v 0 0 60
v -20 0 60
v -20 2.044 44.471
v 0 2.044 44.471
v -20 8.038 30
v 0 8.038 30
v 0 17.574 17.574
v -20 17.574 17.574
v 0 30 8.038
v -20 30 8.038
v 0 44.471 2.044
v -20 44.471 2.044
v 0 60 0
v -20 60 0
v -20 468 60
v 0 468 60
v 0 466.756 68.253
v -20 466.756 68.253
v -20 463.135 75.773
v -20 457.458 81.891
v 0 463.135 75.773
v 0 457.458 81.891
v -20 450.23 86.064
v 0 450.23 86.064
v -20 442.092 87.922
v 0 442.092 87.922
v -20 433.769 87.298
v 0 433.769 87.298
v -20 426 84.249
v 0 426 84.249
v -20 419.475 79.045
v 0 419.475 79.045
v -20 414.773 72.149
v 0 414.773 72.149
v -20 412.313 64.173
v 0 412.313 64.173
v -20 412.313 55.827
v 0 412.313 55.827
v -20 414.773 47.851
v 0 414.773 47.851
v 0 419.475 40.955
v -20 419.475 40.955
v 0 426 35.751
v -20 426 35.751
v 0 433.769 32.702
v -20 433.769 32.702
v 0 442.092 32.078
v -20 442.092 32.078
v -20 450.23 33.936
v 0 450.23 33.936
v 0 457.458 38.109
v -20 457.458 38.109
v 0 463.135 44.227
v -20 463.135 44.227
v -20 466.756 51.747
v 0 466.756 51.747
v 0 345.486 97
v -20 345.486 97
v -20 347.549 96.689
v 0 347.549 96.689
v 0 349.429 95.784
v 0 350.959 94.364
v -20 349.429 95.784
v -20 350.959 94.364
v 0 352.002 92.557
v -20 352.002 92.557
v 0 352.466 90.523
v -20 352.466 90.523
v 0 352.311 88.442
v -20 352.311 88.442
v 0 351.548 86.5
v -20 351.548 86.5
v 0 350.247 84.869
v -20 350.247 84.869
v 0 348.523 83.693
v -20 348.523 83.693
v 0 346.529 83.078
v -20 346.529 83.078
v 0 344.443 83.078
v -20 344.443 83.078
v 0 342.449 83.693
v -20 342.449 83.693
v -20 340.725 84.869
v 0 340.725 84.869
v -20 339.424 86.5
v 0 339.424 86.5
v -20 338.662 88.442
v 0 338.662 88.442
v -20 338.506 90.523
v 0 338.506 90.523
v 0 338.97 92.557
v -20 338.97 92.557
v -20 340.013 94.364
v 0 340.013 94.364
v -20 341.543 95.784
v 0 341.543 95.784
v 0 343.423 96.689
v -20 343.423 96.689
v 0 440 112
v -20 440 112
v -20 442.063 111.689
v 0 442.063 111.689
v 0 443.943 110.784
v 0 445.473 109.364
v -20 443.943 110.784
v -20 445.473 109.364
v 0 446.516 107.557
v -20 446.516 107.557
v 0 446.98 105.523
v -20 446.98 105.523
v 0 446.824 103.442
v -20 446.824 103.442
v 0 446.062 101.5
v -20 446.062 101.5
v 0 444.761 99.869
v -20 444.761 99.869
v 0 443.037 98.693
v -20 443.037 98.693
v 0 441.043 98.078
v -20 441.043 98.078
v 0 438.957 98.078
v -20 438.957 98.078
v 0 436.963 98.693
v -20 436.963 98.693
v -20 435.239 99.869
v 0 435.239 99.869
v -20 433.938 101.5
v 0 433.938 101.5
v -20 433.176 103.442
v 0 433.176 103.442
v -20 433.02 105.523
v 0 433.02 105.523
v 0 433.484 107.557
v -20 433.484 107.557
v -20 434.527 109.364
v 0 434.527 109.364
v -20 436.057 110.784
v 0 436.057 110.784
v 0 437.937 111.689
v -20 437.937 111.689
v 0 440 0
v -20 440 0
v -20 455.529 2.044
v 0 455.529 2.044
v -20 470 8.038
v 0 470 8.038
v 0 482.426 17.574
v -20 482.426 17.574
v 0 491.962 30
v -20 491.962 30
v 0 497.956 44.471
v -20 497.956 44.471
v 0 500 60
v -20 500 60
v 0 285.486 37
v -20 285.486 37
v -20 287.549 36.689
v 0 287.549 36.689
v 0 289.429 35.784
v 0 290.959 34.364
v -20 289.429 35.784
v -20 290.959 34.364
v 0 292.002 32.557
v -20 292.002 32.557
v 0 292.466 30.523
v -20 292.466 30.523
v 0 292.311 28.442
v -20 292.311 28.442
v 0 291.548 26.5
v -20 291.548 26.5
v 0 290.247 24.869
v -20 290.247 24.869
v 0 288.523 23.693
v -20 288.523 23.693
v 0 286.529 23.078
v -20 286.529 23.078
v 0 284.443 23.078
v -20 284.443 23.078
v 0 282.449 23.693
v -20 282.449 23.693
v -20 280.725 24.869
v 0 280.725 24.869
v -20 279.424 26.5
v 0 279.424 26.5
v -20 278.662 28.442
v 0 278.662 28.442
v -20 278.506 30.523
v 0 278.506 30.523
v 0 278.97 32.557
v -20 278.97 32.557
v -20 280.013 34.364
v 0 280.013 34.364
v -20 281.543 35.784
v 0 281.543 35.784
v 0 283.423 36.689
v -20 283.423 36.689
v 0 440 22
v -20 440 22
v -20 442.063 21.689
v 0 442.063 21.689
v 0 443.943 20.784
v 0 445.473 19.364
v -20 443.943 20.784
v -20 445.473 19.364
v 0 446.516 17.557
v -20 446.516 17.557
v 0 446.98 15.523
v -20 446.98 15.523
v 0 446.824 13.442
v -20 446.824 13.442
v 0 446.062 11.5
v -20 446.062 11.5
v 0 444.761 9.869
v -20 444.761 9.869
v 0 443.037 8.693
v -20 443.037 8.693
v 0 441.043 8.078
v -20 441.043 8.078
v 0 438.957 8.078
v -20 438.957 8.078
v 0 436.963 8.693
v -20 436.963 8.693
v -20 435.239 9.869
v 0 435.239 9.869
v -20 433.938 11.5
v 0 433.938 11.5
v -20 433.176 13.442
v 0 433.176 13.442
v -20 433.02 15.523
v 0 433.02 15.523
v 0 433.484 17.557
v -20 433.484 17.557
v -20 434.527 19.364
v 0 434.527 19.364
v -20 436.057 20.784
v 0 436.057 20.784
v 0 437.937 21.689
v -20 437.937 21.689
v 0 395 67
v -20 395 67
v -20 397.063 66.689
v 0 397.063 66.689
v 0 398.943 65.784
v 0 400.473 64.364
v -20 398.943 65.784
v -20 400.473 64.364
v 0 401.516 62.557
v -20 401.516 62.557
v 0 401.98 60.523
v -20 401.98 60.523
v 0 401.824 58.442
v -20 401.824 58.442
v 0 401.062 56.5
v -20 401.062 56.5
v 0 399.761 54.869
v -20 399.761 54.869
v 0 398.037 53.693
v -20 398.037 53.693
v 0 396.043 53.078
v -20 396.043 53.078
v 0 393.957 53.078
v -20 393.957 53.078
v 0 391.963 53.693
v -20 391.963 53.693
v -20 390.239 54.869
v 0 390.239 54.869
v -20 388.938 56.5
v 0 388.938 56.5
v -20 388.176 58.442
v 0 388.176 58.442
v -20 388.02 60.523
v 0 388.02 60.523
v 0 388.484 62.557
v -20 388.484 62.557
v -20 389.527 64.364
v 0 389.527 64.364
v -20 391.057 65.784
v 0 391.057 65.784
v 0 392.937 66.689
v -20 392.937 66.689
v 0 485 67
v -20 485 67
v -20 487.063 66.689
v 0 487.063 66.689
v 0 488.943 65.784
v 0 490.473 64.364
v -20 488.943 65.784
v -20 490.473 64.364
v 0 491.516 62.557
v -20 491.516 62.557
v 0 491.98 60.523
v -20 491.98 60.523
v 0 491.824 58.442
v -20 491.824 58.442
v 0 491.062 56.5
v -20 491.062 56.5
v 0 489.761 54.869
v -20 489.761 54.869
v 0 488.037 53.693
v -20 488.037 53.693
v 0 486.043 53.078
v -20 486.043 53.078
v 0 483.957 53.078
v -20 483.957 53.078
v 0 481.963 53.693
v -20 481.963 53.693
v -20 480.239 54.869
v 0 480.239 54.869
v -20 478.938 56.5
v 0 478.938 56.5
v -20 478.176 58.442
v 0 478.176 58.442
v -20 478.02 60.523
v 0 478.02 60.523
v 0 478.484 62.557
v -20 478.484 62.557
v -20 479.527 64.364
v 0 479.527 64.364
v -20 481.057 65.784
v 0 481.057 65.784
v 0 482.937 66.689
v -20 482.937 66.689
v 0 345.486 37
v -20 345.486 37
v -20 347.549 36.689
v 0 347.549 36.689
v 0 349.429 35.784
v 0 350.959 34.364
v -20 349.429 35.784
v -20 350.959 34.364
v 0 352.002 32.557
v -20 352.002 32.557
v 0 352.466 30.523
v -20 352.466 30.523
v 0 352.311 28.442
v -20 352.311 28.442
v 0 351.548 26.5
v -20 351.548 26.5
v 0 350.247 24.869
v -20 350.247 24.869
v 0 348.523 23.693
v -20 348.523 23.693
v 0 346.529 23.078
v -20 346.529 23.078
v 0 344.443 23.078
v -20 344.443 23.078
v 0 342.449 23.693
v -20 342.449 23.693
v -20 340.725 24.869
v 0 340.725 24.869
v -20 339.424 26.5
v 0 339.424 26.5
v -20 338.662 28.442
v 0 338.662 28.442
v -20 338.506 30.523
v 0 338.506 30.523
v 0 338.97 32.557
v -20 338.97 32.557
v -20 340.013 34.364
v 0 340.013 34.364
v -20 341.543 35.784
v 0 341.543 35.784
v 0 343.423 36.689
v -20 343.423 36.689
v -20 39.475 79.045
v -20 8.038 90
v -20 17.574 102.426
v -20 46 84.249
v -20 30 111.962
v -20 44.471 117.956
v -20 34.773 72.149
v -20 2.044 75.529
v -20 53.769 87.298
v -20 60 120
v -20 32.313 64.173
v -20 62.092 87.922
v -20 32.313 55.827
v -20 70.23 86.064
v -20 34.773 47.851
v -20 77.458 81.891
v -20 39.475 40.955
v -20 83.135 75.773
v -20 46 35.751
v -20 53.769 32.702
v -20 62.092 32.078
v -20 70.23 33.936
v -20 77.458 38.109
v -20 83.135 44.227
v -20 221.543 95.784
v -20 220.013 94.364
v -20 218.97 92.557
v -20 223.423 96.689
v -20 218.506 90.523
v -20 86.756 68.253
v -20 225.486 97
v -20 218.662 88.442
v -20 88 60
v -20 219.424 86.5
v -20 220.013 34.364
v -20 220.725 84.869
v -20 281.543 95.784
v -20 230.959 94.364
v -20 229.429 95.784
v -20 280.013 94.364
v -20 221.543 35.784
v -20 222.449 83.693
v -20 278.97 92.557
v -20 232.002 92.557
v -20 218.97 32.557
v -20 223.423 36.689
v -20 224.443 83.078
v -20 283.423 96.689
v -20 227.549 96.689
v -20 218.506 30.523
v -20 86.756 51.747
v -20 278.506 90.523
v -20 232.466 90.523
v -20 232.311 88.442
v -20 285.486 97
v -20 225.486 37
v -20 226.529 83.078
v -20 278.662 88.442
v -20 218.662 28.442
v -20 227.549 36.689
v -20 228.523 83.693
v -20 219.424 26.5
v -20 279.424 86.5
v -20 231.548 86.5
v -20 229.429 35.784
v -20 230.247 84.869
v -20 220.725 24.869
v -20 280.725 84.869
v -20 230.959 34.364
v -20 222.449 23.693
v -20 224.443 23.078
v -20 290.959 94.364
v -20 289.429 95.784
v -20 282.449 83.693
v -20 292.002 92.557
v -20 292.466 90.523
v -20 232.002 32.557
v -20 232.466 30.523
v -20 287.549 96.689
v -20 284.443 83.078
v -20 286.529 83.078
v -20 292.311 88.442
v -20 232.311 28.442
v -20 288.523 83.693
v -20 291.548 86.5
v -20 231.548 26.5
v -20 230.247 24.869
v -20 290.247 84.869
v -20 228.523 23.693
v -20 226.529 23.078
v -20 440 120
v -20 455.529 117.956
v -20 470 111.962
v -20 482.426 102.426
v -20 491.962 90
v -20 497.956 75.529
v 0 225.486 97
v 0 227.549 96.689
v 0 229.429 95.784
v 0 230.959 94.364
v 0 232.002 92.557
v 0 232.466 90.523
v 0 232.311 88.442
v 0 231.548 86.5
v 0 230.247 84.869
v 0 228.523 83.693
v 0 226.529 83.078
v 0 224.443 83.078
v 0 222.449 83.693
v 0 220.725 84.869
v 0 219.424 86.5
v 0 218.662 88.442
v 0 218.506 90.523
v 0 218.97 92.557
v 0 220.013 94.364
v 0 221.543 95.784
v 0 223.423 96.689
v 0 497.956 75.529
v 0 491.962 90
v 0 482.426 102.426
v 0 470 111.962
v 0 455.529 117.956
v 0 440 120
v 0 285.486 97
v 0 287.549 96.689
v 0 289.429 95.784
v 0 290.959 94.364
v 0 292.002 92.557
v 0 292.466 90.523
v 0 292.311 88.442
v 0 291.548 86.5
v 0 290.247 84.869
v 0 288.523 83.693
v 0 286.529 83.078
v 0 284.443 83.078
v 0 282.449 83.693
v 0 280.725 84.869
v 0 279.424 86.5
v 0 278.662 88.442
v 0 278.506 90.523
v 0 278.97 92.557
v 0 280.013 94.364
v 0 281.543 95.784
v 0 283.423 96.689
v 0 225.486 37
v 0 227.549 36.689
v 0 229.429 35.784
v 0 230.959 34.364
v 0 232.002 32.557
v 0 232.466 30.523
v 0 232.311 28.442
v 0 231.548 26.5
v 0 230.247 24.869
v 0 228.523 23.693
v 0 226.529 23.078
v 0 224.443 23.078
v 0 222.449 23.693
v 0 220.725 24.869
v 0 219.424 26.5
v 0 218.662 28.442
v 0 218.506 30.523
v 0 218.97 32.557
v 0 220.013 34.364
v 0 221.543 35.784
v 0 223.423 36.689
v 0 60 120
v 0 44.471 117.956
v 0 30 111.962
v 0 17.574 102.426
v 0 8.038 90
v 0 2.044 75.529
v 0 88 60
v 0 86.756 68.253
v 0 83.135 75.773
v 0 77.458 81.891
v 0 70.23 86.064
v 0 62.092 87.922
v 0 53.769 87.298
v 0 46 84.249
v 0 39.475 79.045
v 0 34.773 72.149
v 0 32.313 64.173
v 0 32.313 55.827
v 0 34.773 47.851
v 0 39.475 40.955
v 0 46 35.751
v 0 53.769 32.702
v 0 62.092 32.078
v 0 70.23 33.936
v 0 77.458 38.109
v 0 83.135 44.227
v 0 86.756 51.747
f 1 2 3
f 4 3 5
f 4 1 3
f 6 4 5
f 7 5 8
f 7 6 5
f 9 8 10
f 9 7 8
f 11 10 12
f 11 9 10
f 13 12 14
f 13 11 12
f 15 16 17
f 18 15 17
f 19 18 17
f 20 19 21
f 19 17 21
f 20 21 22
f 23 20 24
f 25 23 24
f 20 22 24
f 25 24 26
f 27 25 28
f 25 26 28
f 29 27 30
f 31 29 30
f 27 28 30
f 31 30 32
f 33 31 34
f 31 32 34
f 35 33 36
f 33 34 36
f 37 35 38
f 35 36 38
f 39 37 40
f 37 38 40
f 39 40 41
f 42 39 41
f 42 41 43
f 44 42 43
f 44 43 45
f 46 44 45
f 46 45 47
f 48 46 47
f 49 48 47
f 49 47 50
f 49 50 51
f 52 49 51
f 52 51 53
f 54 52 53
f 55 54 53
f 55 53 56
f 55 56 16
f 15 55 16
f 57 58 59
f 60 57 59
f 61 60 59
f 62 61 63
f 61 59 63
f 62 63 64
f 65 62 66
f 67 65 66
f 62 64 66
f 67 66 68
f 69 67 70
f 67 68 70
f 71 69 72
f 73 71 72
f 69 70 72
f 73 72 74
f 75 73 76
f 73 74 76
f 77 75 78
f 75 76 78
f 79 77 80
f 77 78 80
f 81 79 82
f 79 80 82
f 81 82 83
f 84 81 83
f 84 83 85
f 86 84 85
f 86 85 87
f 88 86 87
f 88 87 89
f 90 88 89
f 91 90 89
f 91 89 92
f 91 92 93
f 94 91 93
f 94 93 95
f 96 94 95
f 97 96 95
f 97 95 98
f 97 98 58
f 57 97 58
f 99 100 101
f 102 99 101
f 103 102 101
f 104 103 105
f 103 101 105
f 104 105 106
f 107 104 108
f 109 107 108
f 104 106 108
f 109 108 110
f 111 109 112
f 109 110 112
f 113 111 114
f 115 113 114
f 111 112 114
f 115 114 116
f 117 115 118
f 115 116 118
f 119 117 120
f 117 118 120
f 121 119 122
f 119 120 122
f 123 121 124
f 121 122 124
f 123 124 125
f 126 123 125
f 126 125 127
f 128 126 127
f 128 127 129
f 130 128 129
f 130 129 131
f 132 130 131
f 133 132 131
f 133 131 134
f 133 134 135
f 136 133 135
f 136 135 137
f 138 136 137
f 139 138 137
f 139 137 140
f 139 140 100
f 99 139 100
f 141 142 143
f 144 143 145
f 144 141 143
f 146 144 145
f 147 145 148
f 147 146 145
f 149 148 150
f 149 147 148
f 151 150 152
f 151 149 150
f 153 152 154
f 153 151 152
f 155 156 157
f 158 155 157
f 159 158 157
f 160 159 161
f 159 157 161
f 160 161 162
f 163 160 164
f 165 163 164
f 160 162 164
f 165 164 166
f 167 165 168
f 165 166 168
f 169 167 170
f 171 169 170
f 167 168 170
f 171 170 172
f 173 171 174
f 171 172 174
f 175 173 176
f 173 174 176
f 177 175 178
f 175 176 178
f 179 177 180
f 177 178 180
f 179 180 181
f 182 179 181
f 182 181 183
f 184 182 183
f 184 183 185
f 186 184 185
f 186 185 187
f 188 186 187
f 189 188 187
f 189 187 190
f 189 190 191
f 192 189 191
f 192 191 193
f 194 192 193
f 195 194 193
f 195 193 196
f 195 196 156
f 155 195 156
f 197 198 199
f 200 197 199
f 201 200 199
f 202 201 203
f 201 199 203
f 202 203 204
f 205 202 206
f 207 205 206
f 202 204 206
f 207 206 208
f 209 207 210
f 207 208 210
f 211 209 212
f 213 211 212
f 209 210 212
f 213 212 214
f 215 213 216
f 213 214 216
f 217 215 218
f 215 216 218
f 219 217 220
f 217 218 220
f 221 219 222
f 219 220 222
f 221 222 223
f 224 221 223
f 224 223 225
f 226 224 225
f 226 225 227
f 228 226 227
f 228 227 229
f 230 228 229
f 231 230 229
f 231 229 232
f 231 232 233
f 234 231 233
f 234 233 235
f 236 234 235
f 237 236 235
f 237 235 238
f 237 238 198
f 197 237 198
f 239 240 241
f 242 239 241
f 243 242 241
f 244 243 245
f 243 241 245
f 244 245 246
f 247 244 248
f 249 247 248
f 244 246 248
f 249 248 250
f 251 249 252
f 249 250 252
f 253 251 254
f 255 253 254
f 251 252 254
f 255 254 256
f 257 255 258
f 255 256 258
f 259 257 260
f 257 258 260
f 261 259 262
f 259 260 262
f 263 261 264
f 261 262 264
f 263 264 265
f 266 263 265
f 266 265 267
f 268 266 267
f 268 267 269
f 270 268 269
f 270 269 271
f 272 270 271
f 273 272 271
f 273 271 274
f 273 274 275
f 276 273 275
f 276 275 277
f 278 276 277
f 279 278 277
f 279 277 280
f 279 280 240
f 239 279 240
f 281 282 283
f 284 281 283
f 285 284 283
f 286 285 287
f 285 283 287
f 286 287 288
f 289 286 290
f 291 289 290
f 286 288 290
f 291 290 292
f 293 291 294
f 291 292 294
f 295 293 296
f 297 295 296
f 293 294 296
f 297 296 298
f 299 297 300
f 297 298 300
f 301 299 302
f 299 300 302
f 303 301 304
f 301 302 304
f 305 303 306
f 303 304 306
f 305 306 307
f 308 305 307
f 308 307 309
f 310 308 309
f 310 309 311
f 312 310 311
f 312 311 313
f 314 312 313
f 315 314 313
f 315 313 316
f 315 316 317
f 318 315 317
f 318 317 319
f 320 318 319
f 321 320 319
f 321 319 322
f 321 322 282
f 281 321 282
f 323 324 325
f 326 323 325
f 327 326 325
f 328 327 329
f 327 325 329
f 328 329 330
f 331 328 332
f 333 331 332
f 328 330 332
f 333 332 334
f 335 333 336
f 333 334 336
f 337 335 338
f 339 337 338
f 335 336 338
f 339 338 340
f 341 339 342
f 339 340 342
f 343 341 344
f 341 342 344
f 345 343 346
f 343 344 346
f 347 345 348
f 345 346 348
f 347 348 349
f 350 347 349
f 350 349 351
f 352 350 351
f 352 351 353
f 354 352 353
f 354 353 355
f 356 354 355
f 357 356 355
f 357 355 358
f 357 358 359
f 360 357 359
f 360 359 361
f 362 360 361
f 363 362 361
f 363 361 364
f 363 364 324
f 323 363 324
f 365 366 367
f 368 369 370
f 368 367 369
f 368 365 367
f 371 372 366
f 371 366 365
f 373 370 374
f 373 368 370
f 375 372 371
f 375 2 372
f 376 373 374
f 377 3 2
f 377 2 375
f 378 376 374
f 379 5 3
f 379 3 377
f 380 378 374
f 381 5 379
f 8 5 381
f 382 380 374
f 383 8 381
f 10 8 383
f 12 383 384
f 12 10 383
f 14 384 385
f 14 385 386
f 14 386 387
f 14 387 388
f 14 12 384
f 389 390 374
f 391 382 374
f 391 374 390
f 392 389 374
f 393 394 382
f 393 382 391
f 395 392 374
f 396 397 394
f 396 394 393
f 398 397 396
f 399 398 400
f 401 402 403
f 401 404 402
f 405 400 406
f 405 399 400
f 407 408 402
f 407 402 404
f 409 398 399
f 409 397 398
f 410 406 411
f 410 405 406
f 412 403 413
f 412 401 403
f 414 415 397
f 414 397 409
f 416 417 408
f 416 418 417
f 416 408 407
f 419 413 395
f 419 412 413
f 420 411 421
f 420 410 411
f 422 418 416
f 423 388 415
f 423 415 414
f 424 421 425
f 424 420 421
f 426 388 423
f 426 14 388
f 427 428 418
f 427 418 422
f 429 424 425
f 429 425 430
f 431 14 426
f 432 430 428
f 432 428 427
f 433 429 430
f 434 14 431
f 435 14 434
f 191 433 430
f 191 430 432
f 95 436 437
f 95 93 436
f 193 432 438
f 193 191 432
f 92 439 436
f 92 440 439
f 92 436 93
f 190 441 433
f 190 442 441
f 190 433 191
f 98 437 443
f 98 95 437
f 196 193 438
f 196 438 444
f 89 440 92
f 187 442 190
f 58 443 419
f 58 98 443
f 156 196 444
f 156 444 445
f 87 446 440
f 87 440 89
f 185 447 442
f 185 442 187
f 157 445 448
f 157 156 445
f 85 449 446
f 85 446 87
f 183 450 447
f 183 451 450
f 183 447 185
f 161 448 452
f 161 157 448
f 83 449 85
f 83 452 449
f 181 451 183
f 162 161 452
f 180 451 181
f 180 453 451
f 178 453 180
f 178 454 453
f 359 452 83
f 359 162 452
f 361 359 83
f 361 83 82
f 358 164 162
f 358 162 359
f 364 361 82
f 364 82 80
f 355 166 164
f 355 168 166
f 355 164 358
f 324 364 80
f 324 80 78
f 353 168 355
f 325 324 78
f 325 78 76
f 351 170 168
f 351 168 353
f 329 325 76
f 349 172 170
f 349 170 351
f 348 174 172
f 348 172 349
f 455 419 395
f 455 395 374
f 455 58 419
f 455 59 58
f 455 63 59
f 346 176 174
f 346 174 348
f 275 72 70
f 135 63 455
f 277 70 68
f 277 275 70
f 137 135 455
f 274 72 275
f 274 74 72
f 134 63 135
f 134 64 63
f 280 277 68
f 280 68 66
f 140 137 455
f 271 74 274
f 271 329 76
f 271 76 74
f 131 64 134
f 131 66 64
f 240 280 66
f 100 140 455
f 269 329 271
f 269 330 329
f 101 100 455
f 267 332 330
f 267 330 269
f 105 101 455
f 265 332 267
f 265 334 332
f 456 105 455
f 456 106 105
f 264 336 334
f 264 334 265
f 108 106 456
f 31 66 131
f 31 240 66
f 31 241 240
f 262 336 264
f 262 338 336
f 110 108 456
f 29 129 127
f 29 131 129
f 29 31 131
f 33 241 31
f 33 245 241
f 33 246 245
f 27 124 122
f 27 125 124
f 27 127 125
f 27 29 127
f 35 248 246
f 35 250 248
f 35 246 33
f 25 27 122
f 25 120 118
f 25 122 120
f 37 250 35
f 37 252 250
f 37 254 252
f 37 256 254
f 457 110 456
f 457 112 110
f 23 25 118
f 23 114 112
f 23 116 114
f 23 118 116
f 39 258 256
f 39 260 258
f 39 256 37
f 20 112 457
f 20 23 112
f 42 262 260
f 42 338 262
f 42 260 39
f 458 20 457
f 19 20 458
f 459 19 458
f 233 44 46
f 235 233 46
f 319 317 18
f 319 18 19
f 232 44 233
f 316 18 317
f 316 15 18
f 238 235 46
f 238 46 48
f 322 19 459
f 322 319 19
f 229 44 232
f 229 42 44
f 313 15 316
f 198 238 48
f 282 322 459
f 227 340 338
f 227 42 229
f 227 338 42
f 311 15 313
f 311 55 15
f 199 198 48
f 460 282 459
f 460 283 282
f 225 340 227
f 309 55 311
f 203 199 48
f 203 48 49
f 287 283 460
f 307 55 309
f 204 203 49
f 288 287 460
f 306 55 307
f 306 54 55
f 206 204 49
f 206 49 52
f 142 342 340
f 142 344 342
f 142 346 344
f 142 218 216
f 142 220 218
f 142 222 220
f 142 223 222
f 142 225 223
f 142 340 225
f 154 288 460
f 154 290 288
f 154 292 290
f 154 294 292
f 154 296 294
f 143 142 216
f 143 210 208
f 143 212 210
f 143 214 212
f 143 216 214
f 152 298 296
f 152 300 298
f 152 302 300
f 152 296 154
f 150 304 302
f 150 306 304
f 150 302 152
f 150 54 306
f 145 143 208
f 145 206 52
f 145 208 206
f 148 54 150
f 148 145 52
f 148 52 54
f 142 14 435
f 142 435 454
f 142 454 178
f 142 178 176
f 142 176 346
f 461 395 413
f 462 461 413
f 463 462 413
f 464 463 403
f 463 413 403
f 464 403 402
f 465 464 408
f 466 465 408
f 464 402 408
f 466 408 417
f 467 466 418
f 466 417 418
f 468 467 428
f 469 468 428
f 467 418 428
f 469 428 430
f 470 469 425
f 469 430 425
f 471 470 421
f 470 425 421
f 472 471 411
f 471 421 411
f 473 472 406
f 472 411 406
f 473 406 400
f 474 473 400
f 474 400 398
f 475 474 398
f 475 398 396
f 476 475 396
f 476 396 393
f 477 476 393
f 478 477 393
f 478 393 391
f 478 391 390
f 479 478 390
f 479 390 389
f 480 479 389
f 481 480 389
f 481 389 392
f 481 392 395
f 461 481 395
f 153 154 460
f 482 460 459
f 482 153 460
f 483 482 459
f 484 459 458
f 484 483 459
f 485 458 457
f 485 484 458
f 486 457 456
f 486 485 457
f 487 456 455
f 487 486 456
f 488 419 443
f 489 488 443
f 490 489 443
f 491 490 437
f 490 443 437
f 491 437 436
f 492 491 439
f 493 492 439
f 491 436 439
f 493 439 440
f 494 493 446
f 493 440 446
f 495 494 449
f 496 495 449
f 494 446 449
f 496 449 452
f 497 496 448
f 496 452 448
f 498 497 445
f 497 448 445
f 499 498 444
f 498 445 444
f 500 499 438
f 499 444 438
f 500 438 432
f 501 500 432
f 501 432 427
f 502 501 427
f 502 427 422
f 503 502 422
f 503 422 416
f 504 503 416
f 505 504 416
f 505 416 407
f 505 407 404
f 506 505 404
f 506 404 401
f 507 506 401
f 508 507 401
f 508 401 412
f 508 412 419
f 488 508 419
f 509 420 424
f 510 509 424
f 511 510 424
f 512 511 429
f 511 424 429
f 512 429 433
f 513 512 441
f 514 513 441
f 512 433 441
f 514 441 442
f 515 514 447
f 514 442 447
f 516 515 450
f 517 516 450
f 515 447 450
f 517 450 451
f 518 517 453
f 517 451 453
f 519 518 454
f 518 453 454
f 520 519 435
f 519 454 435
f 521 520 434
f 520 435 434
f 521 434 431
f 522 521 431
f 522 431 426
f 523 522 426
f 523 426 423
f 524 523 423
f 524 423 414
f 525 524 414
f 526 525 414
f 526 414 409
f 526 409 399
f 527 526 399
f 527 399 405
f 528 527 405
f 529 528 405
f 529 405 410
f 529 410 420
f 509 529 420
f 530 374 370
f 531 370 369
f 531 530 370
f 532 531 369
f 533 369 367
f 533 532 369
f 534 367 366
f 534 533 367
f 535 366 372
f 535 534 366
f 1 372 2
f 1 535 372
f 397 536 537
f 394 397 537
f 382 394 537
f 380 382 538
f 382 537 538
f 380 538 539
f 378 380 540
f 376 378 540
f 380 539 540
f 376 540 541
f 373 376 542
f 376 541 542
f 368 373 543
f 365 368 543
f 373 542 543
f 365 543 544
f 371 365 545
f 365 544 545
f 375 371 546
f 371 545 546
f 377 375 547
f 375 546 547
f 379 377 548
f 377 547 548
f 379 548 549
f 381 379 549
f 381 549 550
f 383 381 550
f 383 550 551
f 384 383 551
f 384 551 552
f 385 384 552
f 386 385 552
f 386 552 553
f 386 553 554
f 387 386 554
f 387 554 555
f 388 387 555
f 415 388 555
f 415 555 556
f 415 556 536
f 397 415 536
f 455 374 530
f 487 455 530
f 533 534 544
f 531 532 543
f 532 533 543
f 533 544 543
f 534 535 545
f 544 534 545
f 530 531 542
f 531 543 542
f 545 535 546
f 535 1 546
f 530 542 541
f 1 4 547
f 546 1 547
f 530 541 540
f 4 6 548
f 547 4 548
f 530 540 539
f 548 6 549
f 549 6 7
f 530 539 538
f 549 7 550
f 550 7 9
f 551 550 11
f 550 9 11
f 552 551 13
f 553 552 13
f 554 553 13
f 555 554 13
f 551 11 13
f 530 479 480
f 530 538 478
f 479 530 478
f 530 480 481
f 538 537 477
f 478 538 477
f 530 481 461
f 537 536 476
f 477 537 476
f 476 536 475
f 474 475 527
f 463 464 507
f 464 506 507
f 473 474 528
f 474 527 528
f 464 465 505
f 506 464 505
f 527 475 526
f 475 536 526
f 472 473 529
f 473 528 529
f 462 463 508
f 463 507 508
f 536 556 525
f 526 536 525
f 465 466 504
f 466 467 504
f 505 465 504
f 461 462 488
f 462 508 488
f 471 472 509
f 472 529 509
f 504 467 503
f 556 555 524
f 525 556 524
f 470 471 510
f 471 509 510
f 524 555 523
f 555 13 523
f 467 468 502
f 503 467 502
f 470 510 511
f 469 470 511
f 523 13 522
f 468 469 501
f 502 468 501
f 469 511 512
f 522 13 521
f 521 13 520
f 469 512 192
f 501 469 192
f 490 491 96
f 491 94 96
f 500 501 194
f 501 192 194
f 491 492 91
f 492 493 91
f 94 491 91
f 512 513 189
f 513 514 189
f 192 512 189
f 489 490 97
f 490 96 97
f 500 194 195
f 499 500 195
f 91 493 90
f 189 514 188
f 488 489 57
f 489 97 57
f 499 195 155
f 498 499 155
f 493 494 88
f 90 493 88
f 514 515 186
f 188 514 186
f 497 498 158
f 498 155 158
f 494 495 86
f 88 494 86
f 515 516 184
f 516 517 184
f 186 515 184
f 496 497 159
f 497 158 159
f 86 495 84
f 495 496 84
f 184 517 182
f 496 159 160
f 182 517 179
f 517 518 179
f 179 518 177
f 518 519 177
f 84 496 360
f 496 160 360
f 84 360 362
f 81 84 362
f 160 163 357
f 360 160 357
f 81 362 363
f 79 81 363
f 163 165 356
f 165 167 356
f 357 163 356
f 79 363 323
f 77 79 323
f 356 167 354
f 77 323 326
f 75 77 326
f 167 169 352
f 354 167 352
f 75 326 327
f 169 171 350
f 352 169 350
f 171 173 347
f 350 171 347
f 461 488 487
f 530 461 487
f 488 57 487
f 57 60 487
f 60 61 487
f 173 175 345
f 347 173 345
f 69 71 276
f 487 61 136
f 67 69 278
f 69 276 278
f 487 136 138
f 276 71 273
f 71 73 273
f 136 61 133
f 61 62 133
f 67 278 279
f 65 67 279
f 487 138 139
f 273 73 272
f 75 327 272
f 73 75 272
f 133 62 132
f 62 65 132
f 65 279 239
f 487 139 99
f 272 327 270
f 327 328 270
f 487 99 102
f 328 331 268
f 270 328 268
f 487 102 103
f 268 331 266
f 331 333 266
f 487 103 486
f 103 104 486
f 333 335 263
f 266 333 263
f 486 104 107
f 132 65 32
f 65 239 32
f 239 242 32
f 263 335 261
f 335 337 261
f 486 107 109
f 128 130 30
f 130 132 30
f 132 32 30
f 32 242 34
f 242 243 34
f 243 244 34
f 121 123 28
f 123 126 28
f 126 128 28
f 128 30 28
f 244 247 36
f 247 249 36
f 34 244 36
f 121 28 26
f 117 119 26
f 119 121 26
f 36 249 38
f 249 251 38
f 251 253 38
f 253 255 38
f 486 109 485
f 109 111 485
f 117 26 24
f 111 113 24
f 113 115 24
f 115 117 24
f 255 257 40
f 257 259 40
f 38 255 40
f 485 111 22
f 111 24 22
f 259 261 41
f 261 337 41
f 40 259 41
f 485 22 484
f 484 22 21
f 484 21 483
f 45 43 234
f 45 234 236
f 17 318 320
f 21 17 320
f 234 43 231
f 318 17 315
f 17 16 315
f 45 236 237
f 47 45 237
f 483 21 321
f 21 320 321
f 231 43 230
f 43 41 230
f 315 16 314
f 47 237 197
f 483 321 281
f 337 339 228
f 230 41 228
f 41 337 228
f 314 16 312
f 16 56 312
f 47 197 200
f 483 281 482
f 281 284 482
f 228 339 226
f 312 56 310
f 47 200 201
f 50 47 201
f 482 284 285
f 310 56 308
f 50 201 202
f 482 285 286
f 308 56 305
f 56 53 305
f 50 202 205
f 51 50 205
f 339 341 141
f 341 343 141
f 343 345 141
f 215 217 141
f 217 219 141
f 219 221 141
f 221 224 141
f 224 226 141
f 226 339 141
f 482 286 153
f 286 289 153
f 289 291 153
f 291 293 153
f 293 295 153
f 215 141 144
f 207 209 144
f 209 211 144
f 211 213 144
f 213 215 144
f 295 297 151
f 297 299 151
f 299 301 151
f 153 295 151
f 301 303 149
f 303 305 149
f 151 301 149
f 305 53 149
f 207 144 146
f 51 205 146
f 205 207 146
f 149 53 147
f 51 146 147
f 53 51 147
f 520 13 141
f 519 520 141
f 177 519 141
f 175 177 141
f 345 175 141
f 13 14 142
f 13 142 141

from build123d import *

# Parameters (mm, degrees)
SKETCH_2_W                  = 20
SKETCH_2_H                  = 500
SM_BASE_FLANGE_1_DEPTH      = 120
SKETCH_3_R                  = 28
CUT_EXTRUDE_1_DEPTH         = 515.587213211
CUT_EXTRUDE_START           = -20
CUT_EXTRUDE_2_DEPTH         = 20
HOLE_WIZARD_14_0_14_1_D     = 14
HOLE_WIZARD_14_0_14_1_DEPTH = 45
HOLE_WIZARD_14_0_14_1_TIP   = 4.206024333


# Read off the part's stored shape, not the designer's step: 切除-拉伸2
# Sheet-metal steps are written as plain solids
with BuildPart() as part:
    # 草图2 → 基体-法兰1 (new body)
    with BuildSketch(Plane.XY):
        with Locations((-10, 250)):
            Rectangle(SKETCH_2_W, SKETCH_2_H)
    extrude(amount=SM_BASE_FLANGE_1_DEPTH)

    # 草图3 → 切除-拉伸1 (cut, through all)
    with BuildSketch(Plane(origin=(0, 0, 0), x_dir=(0, 0, -1), z_dir=(1, 0, 0))):
        with Locations(Location((-60, 60, 0), (0, 0, 90))):
            Circle(SKETCH_3_R)
        with Locations(Location((-60, 440, 0), (0, 0, 90))):
            Circle(SKETCH_3_R)
    extrude(amount=-CUT_EXTRUDE_1_DEPTH, mode=Mode.SUBTRACT)

    # 切除-拉伸2 outline → 切除-拉伸2 (cut)
    with BuildSketch(Plane.ZY.offset(20).offset(CUT_EXTRUDE_START)):
        with BuildLine():
            ThreePointArc((60, 0), (17.573593129, 17.573593129), (0, 60))
            Line((0, 60), (0, 0))
            Line((0, 0), (60, 0))
        make_face()
        with BuildLine():
            ThreePointArc((120, 60), (102.426406871, 17.573593129), (60, 0))
            Line((60, 0), (120, 0))
            Line((120, 0), (120, 60))
        make_face()
        with BuildLine():
            Line((0, 500), (0, 440))
            ThreePointArc((0, 440), (17.573593129, 482.426406871), (60, 500))
            Line((60, 500), (0, 500))
        make_face()
        with BuildLine():
            Line((120, 500), (60, 500))
            ThreePointArc((60, 500), (102.426406871, 482.426406871), (120, 440))
            Line((120, 440), (120, 500))
        make_face()
    extrude(amount=CUT_EXTRUDE_2_DEPTH, mode=Mode.SUBTRACT)

    # Ø14.0 (14) 直径孔1
    with Locations(Plane(origin=(0, 0, 0), x_dir=(0, 0, -1), z_dir=(1, 0, 0))):
        with Locations((-60, 485), (-105, 440), (-60, 395), (-15, 440), (-90, 225.486069721), (-90, 285.486069721), (-30, 285.486069721), (-30, 225.486069721), (-30, 345.486069721), (-90, 345.486069721)):
            Hole(HOLE_WIZARD_14_0_14_1_D / 2, depth=HOLE_WIZARD_14_0_14_1_DEPTH)
            with Locations((0, 0, -(HOLE_WIZARD_14_0_14_1_DEPTH + HOLE_WIZARD_14_0_14_1_TIP / 2))):  # 118° drill point
                Cone(0, HOLE_WIZARD_14_0_14_1_D / 2, HOLE_WIZARD_14_0_14_1_TIP, mode=Mode.SUBTRACT)


solid = part.part
